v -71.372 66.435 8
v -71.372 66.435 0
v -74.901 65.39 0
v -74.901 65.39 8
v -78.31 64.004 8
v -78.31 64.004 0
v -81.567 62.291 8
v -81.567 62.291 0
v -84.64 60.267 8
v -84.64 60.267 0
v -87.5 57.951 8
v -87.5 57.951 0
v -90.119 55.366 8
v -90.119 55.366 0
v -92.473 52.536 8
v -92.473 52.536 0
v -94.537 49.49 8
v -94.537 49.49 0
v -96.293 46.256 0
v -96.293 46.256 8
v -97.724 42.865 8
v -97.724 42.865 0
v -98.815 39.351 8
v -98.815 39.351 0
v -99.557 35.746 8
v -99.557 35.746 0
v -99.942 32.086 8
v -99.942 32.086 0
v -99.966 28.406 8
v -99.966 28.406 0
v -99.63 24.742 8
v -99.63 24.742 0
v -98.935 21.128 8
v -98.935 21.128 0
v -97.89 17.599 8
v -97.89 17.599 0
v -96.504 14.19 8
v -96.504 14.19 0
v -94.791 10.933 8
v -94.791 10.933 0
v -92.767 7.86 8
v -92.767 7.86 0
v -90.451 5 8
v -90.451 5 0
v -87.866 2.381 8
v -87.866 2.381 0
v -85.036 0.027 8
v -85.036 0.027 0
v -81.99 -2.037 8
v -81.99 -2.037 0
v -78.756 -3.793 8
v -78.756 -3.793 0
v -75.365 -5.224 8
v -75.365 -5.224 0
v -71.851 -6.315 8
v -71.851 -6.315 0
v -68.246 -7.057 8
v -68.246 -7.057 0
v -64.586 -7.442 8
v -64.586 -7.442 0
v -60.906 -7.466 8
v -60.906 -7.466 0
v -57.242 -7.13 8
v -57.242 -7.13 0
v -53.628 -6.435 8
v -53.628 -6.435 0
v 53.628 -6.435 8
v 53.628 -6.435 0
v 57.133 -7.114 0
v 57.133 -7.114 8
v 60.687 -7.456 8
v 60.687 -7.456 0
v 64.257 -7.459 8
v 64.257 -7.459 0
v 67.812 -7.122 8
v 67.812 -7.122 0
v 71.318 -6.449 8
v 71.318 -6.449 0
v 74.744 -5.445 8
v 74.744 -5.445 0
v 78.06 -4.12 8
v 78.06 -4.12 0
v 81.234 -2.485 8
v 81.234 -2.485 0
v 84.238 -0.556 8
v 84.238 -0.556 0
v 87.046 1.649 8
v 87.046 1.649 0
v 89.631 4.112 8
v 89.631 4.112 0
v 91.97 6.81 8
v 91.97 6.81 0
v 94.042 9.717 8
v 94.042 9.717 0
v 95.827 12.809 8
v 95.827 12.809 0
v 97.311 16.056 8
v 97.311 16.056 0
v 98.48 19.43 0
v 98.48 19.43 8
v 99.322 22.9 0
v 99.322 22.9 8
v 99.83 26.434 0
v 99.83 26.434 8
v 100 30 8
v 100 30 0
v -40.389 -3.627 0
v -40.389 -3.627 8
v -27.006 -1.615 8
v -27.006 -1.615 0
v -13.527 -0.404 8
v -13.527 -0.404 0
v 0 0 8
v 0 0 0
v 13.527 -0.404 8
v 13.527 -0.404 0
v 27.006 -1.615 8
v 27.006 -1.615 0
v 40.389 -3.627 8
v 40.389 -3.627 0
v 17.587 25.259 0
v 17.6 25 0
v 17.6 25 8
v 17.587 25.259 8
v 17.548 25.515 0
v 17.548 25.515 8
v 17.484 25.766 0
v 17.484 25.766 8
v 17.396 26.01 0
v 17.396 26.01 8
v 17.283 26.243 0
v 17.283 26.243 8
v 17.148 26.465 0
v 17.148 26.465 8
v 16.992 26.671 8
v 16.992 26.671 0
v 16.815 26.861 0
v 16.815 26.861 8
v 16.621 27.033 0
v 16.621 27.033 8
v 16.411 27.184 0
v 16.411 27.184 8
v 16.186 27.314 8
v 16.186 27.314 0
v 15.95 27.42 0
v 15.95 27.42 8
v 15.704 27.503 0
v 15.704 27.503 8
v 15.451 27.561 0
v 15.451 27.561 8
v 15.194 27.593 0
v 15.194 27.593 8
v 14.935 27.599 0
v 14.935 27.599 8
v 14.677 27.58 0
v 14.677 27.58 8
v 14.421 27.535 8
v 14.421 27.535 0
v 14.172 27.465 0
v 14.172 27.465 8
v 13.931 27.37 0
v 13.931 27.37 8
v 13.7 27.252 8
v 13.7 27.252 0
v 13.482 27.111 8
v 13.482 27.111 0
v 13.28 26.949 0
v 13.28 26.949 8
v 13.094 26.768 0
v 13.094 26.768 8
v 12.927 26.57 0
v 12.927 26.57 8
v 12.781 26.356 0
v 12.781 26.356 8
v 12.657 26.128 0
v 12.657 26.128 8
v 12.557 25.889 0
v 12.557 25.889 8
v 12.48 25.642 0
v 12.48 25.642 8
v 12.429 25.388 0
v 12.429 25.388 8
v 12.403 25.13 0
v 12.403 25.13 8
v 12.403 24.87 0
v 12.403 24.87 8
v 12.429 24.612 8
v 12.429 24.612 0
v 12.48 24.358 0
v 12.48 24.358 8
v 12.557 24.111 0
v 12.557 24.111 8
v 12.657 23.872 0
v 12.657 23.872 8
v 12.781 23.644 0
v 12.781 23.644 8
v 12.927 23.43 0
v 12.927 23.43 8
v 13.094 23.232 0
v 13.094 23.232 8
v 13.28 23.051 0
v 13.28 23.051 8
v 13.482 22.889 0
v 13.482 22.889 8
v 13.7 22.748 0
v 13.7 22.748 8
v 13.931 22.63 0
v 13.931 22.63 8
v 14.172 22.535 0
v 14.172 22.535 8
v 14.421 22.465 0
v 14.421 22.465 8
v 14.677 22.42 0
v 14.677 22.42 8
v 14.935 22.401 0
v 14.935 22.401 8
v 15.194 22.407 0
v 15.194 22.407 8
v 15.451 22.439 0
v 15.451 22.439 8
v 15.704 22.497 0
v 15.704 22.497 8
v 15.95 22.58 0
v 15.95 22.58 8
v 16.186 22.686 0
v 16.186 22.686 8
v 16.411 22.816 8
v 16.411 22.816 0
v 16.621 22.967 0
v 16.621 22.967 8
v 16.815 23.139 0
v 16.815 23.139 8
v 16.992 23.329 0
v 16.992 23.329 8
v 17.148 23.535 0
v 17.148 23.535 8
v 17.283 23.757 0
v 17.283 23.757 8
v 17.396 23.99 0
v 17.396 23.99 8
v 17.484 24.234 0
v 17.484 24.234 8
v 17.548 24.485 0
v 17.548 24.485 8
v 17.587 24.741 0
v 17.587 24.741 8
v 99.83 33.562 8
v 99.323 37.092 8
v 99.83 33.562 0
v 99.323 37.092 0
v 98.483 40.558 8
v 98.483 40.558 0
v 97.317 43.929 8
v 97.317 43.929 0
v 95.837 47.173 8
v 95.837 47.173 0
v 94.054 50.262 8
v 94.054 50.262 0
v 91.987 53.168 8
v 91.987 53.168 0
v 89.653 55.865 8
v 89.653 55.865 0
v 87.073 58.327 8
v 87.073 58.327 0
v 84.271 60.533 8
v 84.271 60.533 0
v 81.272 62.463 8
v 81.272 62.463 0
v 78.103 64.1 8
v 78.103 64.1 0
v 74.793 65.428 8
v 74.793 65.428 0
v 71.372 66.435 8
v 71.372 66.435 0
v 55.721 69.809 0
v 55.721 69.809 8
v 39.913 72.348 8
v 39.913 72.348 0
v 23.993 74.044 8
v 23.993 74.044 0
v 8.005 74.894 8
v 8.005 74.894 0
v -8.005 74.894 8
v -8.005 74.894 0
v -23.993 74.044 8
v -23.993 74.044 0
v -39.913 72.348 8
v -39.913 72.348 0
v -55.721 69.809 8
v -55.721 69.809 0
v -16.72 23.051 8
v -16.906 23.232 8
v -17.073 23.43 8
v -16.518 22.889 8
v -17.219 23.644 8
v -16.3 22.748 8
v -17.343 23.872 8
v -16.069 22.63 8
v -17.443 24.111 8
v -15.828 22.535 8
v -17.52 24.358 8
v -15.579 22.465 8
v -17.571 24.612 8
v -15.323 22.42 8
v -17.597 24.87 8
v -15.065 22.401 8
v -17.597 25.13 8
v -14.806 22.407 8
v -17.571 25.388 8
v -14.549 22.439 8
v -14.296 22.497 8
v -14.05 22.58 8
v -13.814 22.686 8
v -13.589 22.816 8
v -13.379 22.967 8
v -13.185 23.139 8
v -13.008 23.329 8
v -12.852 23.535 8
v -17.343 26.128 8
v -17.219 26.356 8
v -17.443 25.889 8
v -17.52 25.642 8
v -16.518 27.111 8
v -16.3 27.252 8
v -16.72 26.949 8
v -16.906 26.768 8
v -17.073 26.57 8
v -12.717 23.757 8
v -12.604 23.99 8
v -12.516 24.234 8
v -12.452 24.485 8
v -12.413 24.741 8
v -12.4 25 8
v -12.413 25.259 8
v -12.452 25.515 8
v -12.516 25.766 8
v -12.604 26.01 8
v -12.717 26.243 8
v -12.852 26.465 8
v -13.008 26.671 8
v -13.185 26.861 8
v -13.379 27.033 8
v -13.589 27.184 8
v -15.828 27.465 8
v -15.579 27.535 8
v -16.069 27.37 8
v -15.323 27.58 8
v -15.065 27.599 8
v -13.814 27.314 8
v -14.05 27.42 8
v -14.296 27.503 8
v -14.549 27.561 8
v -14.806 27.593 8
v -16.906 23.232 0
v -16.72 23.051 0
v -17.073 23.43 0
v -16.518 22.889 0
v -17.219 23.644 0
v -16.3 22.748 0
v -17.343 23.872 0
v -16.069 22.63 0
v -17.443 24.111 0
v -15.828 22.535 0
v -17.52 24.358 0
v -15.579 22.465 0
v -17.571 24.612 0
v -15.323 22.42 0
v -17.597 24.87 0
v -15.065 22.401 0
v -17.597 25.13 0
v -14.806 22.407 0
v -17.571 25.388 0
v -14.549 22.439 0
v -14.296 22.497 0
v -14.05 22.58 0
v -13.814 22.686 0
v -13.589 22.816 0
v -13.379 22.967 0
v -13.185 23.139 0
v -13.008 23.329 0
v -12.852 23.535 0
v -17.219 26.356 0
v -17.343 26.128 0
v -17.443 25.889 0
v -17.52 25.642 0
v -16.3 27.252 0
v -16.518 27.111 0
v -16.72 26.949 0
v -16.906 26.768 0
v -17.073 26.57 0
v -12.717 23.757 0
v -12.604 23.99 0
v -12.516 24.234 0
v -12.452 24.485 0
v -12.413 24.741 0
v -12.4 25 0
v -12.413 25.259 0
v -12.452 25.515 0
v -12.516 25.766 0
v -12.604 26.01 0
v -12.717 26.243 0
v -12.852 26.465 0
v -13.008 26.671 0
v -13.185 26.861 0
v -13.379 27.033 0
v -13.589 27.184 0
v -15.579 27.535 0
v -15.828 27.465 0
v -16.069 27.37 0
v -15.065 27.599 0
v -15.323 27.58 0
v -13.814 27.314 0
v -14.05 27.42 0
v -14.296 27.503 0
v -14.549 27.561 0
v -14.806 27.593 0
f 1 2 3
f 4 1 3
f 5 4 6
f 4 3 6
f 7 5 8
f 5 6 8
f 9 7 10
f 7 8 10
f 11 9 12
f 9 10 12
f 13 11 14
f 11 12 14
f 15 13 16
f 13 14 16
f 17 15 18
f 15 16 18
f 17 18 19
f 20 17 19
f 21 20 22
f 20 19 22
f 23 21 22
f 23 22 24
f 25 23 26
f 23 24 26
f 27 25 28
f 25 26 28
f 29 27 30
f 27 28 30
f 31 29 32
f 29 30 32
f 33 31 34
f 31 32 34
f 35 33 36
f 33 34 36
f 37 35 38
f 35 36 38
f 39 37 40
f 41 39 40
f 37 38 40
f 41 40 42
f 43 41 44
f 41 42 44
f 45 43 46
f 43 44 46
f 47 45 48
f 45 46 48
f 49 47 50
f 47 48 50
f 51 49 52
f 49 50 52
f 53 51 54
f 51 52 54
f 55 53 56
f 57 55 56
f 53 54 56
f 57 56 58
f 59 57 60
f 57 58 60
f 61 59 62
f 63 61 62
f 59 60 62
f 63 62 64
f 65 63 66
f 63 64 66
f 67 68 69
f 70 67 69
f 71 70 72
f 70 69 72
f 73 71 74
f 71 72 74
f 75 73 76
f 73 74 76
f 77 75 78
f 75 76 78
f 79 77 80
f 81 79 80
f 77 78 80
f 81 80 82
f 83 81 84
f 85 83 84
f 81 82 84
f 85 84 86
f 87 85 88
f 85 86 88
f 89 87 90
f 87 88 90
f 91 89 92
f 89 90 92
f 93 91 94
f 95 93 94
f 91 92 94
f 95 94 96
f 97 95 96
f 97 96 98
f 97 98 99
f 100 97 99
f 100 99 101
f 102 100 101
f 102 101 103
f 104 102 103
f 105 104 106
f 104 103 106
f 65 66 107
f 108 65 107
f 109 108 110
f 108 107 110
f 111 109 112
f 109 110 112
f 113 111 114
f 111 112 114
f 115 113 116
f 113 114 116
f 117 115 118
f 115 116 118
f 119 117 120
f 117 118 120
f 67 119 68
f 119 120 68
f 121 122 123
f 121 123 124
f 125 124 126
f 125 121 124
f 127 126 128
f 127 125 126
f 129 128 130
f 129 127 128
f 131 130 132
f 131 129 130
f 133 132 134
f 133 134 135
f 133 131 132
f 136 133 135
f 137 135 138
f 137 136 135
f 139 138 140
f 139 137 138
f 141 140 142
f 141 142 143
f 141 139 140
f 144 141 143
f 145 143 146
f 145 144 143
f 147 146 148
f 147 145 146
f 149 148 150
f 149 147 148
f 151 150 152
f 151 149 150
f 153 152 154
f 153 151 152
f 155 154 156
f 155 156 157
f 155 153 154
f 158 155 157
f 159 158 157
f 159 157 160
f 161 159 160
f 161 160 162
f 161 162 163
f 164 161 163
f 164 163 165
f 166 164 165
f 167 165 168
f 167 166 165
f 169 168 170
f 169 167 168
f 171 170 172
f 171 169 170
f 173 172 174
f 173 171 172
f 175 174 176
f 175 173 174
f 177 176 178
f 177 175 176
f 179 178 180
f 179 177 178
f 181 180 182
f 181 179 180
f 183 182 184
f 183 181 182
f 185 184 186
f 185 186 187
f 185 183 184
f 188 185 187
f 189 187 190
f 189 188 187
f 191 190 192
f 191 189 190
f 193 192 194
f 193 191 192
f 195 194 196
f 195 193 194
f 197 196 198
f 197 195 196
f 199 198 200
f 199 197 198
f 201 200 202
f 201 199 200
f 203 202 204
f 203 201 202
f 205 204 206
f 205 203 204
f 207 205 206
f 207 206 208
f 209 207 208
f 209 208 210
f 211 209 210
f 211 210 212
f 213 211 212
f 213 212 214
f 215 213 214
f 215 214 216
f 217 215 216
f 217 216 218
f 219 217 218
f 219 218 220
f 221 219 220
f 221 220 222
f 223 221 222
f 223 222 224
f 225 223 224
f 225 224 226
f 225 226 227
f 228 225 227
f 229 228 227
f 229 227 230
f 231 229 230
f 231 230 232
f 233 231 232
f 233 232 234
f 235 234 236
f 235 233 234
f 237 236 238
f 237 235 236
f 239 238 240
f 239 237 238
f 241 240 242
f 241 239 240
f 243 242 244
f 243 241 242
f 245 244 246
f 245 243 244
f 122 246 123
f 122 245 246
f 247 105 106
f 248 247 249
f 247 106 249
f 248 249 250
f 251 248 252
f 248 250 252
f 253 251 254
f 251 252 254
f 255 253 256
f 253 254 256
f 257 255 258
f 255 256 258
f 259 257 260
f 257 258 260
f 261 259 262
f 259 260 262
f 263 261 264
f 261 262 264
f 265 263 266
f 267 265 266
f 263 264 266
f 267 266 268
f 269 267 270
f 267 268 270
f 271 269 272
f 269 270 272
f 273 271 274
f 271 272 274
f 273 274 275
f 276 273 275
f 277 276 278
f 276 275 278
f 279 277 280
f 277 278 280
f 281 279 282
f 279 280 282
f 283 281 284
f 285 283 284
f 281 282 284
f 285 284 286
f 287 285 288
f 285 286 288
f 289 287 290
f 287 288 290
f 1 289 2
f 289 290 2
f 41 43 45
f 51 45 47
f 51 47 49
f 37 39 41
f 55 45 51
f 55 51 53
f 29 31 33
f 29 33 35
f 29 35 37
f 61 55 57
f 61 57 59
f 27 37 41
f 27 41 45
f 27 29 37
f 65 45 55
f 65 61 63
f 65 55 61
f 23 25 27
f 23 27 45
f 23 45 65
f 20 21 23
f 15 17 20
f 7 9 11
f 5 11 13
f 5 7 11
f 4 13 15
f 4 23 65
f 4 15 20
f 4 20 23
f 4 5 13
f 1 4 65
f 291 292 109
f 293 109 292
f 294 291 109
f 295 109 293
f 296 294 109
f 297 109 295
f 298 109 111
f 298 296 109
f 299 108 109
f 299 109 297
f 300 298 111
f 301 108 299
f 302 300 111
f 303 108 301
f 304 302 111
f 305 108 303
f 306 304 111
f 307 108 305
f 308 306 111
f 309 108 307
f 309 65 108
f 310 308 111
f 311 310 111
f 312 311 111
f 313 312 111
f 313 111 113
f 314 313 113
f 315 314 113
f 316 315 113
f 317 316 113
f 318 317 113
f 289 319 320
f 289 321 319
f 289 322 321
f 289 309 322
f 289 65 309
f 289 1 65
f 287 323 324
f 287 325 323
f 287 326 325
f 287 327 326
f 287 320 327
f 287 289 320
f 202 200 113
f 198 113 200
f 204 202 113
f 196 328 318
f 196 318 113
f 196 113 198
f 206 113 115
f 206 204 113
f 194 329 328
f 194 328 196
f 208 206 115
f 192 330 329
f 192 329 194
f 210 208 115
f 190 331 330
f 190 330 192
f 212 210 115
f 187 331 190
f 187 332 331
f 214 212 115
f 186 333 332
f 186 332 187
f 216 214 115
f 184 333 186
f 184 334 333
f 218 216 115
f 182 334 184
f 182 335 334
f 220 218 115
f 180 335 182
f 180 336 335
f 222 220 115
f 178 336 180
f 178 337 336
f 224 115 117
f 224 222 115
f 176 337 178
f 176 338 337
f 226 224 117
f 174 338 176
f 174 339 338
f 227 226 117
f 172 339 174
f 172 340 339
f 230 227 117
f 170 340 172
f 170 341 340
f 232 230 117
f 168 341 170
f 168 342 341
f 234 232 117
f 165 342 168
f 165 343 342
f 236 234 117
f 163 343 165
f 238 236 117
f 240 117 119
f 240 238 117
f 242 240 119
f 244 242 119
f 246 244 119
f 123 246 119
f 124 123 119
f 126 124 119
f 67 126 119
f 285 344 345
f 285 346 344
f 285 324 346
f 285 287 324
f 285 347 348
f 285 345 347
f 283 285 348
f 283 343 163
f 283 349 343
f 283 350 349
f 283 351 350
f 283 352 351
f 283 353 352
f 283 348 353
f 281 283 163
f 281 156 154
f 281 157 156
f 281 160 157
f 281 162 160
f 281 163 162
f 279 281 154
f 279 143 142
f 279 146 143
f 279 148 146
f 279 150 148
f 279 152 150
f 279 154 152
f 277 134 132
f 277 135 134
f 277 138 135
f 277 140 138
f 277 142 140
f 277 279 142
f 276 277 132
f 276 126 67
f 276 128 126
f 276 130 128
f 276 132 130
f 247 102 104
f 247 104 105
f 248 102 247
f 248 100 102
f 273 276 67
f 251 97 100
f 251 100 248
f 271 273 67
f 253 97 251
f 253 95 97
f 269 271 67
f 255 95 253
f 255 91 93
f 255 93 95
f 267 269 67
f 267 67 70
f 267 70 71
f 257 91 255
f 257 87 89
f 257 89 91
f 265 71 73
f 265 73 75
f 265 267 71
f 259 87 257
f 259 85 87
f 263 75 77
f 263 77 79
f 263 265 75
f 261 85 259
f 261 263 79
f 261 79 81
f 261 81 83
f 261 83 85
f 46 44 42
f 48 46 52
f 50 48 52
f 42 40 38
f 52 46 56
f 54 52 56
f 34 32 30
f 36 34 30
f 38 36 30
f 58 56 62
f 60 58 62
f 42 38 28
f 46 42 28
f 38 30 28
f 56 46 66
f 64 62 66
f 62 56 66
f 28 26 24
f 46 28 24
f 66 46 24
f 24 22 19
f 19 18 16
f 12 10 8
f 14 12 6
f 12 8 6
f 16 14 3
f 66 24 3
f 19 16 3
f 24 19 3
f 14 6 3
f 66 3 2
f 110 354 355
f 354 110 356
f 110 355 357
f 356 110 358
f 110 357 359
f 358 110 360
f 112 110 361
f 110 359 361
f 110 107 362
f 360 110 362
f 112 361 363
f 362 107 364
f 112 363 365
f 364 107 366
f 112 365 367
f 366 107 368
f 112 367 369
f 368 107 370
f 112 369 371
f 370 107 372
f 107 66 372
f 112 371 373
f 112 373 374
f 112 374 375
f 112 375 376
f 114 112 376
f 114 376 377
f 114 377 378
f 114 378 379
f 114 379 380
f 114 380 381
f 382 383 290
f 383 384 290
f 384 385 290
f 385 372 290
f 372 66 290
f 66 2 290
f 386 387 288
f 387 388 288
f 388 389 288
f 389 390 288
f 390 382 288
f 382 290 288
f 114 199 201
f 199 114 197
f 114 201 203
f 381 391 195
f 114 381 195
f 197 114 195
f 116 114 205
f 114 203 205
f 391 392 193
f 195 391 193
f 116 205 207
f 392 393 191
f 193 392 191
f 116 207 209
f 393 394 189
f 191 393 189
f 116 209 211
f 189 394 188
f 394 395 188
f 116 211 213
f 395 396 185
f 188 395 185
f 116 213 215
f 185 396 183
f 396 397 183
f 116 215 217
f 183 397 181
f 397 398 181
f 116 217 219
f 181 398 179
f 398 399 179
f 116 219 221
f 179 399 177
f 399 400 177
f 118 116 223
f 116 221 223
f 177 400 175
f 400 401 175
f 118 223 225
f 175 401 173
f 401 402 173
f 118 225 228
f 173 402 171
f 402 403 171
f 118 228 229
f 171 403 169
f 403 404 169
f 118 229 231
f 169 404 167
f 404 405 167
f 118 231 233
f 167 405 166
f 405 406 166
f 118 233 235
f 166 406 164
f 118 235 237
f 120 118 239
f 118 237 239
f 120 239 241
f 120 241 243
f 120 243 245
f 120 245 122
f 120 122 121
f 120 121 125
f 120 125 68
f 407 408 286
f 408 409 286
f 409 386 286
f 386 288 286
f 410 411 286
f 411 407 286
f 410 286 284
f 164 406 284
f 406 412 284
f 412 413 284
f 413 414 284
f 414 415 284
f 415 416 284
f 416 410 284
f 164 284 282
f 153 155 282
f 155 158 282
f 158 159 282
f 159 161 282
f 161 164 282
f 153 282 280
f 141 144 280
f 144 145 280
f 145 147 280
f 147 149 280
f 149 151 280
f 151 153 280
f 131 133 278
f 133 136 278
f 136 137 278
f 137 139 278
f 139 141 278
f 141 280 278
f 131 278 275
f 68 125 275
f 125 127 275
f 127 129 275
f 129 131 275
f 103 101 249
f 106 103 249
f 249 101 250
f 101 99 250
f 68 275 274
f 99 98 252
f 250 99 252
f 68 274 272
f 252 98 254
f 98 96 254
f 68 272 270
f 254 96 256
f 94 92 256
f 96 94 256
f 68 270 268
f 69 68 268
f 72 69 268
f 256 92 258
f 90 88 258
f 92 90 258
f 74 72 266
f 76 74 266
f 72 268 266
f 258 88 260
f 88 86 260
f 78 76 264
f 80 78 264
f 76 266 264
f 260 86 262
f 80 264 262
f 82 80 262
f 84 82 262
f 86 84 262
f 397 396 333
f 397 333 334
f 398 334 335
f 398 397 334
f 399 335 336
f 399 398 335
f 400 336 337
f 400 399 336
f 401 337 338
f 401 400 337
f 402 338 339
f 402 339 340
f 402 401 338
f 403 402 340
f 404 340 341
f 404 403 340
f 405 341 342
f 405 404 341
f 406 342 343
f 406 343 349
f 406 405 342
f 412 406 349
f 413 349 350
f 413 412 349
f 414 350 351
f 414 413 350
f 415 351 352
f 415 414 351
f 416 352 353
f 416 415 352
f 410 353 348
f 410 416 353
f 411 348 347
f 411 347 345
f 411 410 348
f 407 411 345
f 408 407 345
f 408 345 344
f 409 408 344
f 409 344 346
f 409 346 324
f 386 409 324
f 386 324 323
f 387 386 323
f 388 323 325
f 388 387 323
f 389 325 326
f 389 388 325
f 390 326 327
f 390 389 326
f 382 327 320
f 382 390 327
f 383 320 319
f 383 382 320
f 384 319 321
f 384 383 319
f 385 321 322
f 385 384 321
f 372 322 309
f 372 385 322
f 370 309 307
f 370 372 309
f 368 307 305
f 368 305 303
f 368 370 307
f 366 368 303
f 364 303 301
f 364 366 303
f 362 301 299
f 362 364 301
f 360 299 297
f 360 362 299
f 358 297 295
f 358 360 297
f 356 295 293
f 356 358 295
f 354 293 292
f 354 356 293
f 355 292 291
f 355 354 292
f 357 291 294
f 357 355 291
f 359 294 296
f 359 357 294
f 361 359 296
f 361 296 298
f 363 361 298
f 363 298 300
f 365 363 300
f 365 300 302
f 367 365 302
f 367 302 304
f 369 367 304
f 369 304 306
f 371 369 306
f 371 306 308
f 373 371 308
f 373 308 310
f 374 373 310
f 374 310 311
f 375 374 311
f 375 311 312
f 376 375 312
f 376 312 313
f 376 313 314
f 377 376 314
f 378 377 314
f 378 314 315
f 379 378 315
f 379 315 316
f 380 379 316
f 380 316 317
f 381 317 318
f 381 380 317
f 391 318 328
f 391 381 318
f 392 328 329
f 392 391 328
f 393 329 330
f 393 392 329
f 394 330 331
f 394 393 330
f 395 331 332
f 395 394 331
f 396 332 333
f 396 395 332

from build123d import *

# Parameters (mm, degrees)
F1_R     = 2.6
F1_R_2   = 1.75
F2_DEPTH = 8


with BuildPart() as f2:
    # F1 (on Top) → F2 (new body)
    with BuildSketch(Plane.XY):
        with BuildLine():
            ThreePointArc((-71.3722397476, 66.4353312303), (-39.3316918026, 59.4869377058), (-25, 30))
            ThreePointArc((-25, 30), (-33.0130622942, 6.8316918026), (-53.6277602524, -6.4353312303))
            ThreePointArc((-53.6277602524, -6.4353312303), (0, 0), (53.6277602524, -6.4353312303))
            ThreePointArc((53.6277602524, -6.4353312303), (26.0646687697, 38.8722397476), (71.3722397476, 66.4353312303))
            ThreePointArc((71.3722397476, 66.4353312303), (0, 75), (-71.3722397476, 66.4353312303))
        make_face()
        with Locations((-15, 25)):
            Circle(F1_R, mode=Mode.SUBTRACT)
        with Locations((0, 25)):
            Circle(F1_R, mode=Mode.SUBTRACT)
        with Locations((15, 25)):
            Circle(F1_R, mode=Mode.SUBTRACT)
        with BuildLine():
            ThreePointArc((-53.6277602524, -6.4353312303), (-33.0130622942, 6.8316918026), (-25, 30))
            ThreePointArc((-25, 30), (-39.3316918026, 59.4869377058), (-71.3722397476, 66.4353312303))
            ThreePointArc((-71.3722397476, 66.4353312303), (-98.9353312303, 21.1277602524), (-53.6277602524, -6.4353312303))
        make_face()
        with Locations((-50, 20)):
            Circle(F1_R_2, mode=Mode.SUBTRACT)
        with BuildLine():
            ThreePointArc((100, 30), (91.9869377058, 53.1683081974), (71.3722397476, 66.4353312303))
            ThreePointArc((71.3722397476, 66.4353312303), (26.0646687697, 38.8722397476), (53.6277602524, -6.4353312303))
            ThreePointArc((53.6277602524, -6.4353312303), (85.6683081974, 0.5130622942), (100, 30))
        make_face()
        with Locations((50, 20)):
            Circle(F1_R_2, mode=Mode.SUBTRACT)
        with Locations((0, 25)):
            Circle(F1_R)
        with Locations((-50, 20)):
            Circle(F1_R_2)
        with Locations((50, 20)):
            Circle(F1_R_2)
    extrude(amount=F2_DEPTH)


solid = f2.part
